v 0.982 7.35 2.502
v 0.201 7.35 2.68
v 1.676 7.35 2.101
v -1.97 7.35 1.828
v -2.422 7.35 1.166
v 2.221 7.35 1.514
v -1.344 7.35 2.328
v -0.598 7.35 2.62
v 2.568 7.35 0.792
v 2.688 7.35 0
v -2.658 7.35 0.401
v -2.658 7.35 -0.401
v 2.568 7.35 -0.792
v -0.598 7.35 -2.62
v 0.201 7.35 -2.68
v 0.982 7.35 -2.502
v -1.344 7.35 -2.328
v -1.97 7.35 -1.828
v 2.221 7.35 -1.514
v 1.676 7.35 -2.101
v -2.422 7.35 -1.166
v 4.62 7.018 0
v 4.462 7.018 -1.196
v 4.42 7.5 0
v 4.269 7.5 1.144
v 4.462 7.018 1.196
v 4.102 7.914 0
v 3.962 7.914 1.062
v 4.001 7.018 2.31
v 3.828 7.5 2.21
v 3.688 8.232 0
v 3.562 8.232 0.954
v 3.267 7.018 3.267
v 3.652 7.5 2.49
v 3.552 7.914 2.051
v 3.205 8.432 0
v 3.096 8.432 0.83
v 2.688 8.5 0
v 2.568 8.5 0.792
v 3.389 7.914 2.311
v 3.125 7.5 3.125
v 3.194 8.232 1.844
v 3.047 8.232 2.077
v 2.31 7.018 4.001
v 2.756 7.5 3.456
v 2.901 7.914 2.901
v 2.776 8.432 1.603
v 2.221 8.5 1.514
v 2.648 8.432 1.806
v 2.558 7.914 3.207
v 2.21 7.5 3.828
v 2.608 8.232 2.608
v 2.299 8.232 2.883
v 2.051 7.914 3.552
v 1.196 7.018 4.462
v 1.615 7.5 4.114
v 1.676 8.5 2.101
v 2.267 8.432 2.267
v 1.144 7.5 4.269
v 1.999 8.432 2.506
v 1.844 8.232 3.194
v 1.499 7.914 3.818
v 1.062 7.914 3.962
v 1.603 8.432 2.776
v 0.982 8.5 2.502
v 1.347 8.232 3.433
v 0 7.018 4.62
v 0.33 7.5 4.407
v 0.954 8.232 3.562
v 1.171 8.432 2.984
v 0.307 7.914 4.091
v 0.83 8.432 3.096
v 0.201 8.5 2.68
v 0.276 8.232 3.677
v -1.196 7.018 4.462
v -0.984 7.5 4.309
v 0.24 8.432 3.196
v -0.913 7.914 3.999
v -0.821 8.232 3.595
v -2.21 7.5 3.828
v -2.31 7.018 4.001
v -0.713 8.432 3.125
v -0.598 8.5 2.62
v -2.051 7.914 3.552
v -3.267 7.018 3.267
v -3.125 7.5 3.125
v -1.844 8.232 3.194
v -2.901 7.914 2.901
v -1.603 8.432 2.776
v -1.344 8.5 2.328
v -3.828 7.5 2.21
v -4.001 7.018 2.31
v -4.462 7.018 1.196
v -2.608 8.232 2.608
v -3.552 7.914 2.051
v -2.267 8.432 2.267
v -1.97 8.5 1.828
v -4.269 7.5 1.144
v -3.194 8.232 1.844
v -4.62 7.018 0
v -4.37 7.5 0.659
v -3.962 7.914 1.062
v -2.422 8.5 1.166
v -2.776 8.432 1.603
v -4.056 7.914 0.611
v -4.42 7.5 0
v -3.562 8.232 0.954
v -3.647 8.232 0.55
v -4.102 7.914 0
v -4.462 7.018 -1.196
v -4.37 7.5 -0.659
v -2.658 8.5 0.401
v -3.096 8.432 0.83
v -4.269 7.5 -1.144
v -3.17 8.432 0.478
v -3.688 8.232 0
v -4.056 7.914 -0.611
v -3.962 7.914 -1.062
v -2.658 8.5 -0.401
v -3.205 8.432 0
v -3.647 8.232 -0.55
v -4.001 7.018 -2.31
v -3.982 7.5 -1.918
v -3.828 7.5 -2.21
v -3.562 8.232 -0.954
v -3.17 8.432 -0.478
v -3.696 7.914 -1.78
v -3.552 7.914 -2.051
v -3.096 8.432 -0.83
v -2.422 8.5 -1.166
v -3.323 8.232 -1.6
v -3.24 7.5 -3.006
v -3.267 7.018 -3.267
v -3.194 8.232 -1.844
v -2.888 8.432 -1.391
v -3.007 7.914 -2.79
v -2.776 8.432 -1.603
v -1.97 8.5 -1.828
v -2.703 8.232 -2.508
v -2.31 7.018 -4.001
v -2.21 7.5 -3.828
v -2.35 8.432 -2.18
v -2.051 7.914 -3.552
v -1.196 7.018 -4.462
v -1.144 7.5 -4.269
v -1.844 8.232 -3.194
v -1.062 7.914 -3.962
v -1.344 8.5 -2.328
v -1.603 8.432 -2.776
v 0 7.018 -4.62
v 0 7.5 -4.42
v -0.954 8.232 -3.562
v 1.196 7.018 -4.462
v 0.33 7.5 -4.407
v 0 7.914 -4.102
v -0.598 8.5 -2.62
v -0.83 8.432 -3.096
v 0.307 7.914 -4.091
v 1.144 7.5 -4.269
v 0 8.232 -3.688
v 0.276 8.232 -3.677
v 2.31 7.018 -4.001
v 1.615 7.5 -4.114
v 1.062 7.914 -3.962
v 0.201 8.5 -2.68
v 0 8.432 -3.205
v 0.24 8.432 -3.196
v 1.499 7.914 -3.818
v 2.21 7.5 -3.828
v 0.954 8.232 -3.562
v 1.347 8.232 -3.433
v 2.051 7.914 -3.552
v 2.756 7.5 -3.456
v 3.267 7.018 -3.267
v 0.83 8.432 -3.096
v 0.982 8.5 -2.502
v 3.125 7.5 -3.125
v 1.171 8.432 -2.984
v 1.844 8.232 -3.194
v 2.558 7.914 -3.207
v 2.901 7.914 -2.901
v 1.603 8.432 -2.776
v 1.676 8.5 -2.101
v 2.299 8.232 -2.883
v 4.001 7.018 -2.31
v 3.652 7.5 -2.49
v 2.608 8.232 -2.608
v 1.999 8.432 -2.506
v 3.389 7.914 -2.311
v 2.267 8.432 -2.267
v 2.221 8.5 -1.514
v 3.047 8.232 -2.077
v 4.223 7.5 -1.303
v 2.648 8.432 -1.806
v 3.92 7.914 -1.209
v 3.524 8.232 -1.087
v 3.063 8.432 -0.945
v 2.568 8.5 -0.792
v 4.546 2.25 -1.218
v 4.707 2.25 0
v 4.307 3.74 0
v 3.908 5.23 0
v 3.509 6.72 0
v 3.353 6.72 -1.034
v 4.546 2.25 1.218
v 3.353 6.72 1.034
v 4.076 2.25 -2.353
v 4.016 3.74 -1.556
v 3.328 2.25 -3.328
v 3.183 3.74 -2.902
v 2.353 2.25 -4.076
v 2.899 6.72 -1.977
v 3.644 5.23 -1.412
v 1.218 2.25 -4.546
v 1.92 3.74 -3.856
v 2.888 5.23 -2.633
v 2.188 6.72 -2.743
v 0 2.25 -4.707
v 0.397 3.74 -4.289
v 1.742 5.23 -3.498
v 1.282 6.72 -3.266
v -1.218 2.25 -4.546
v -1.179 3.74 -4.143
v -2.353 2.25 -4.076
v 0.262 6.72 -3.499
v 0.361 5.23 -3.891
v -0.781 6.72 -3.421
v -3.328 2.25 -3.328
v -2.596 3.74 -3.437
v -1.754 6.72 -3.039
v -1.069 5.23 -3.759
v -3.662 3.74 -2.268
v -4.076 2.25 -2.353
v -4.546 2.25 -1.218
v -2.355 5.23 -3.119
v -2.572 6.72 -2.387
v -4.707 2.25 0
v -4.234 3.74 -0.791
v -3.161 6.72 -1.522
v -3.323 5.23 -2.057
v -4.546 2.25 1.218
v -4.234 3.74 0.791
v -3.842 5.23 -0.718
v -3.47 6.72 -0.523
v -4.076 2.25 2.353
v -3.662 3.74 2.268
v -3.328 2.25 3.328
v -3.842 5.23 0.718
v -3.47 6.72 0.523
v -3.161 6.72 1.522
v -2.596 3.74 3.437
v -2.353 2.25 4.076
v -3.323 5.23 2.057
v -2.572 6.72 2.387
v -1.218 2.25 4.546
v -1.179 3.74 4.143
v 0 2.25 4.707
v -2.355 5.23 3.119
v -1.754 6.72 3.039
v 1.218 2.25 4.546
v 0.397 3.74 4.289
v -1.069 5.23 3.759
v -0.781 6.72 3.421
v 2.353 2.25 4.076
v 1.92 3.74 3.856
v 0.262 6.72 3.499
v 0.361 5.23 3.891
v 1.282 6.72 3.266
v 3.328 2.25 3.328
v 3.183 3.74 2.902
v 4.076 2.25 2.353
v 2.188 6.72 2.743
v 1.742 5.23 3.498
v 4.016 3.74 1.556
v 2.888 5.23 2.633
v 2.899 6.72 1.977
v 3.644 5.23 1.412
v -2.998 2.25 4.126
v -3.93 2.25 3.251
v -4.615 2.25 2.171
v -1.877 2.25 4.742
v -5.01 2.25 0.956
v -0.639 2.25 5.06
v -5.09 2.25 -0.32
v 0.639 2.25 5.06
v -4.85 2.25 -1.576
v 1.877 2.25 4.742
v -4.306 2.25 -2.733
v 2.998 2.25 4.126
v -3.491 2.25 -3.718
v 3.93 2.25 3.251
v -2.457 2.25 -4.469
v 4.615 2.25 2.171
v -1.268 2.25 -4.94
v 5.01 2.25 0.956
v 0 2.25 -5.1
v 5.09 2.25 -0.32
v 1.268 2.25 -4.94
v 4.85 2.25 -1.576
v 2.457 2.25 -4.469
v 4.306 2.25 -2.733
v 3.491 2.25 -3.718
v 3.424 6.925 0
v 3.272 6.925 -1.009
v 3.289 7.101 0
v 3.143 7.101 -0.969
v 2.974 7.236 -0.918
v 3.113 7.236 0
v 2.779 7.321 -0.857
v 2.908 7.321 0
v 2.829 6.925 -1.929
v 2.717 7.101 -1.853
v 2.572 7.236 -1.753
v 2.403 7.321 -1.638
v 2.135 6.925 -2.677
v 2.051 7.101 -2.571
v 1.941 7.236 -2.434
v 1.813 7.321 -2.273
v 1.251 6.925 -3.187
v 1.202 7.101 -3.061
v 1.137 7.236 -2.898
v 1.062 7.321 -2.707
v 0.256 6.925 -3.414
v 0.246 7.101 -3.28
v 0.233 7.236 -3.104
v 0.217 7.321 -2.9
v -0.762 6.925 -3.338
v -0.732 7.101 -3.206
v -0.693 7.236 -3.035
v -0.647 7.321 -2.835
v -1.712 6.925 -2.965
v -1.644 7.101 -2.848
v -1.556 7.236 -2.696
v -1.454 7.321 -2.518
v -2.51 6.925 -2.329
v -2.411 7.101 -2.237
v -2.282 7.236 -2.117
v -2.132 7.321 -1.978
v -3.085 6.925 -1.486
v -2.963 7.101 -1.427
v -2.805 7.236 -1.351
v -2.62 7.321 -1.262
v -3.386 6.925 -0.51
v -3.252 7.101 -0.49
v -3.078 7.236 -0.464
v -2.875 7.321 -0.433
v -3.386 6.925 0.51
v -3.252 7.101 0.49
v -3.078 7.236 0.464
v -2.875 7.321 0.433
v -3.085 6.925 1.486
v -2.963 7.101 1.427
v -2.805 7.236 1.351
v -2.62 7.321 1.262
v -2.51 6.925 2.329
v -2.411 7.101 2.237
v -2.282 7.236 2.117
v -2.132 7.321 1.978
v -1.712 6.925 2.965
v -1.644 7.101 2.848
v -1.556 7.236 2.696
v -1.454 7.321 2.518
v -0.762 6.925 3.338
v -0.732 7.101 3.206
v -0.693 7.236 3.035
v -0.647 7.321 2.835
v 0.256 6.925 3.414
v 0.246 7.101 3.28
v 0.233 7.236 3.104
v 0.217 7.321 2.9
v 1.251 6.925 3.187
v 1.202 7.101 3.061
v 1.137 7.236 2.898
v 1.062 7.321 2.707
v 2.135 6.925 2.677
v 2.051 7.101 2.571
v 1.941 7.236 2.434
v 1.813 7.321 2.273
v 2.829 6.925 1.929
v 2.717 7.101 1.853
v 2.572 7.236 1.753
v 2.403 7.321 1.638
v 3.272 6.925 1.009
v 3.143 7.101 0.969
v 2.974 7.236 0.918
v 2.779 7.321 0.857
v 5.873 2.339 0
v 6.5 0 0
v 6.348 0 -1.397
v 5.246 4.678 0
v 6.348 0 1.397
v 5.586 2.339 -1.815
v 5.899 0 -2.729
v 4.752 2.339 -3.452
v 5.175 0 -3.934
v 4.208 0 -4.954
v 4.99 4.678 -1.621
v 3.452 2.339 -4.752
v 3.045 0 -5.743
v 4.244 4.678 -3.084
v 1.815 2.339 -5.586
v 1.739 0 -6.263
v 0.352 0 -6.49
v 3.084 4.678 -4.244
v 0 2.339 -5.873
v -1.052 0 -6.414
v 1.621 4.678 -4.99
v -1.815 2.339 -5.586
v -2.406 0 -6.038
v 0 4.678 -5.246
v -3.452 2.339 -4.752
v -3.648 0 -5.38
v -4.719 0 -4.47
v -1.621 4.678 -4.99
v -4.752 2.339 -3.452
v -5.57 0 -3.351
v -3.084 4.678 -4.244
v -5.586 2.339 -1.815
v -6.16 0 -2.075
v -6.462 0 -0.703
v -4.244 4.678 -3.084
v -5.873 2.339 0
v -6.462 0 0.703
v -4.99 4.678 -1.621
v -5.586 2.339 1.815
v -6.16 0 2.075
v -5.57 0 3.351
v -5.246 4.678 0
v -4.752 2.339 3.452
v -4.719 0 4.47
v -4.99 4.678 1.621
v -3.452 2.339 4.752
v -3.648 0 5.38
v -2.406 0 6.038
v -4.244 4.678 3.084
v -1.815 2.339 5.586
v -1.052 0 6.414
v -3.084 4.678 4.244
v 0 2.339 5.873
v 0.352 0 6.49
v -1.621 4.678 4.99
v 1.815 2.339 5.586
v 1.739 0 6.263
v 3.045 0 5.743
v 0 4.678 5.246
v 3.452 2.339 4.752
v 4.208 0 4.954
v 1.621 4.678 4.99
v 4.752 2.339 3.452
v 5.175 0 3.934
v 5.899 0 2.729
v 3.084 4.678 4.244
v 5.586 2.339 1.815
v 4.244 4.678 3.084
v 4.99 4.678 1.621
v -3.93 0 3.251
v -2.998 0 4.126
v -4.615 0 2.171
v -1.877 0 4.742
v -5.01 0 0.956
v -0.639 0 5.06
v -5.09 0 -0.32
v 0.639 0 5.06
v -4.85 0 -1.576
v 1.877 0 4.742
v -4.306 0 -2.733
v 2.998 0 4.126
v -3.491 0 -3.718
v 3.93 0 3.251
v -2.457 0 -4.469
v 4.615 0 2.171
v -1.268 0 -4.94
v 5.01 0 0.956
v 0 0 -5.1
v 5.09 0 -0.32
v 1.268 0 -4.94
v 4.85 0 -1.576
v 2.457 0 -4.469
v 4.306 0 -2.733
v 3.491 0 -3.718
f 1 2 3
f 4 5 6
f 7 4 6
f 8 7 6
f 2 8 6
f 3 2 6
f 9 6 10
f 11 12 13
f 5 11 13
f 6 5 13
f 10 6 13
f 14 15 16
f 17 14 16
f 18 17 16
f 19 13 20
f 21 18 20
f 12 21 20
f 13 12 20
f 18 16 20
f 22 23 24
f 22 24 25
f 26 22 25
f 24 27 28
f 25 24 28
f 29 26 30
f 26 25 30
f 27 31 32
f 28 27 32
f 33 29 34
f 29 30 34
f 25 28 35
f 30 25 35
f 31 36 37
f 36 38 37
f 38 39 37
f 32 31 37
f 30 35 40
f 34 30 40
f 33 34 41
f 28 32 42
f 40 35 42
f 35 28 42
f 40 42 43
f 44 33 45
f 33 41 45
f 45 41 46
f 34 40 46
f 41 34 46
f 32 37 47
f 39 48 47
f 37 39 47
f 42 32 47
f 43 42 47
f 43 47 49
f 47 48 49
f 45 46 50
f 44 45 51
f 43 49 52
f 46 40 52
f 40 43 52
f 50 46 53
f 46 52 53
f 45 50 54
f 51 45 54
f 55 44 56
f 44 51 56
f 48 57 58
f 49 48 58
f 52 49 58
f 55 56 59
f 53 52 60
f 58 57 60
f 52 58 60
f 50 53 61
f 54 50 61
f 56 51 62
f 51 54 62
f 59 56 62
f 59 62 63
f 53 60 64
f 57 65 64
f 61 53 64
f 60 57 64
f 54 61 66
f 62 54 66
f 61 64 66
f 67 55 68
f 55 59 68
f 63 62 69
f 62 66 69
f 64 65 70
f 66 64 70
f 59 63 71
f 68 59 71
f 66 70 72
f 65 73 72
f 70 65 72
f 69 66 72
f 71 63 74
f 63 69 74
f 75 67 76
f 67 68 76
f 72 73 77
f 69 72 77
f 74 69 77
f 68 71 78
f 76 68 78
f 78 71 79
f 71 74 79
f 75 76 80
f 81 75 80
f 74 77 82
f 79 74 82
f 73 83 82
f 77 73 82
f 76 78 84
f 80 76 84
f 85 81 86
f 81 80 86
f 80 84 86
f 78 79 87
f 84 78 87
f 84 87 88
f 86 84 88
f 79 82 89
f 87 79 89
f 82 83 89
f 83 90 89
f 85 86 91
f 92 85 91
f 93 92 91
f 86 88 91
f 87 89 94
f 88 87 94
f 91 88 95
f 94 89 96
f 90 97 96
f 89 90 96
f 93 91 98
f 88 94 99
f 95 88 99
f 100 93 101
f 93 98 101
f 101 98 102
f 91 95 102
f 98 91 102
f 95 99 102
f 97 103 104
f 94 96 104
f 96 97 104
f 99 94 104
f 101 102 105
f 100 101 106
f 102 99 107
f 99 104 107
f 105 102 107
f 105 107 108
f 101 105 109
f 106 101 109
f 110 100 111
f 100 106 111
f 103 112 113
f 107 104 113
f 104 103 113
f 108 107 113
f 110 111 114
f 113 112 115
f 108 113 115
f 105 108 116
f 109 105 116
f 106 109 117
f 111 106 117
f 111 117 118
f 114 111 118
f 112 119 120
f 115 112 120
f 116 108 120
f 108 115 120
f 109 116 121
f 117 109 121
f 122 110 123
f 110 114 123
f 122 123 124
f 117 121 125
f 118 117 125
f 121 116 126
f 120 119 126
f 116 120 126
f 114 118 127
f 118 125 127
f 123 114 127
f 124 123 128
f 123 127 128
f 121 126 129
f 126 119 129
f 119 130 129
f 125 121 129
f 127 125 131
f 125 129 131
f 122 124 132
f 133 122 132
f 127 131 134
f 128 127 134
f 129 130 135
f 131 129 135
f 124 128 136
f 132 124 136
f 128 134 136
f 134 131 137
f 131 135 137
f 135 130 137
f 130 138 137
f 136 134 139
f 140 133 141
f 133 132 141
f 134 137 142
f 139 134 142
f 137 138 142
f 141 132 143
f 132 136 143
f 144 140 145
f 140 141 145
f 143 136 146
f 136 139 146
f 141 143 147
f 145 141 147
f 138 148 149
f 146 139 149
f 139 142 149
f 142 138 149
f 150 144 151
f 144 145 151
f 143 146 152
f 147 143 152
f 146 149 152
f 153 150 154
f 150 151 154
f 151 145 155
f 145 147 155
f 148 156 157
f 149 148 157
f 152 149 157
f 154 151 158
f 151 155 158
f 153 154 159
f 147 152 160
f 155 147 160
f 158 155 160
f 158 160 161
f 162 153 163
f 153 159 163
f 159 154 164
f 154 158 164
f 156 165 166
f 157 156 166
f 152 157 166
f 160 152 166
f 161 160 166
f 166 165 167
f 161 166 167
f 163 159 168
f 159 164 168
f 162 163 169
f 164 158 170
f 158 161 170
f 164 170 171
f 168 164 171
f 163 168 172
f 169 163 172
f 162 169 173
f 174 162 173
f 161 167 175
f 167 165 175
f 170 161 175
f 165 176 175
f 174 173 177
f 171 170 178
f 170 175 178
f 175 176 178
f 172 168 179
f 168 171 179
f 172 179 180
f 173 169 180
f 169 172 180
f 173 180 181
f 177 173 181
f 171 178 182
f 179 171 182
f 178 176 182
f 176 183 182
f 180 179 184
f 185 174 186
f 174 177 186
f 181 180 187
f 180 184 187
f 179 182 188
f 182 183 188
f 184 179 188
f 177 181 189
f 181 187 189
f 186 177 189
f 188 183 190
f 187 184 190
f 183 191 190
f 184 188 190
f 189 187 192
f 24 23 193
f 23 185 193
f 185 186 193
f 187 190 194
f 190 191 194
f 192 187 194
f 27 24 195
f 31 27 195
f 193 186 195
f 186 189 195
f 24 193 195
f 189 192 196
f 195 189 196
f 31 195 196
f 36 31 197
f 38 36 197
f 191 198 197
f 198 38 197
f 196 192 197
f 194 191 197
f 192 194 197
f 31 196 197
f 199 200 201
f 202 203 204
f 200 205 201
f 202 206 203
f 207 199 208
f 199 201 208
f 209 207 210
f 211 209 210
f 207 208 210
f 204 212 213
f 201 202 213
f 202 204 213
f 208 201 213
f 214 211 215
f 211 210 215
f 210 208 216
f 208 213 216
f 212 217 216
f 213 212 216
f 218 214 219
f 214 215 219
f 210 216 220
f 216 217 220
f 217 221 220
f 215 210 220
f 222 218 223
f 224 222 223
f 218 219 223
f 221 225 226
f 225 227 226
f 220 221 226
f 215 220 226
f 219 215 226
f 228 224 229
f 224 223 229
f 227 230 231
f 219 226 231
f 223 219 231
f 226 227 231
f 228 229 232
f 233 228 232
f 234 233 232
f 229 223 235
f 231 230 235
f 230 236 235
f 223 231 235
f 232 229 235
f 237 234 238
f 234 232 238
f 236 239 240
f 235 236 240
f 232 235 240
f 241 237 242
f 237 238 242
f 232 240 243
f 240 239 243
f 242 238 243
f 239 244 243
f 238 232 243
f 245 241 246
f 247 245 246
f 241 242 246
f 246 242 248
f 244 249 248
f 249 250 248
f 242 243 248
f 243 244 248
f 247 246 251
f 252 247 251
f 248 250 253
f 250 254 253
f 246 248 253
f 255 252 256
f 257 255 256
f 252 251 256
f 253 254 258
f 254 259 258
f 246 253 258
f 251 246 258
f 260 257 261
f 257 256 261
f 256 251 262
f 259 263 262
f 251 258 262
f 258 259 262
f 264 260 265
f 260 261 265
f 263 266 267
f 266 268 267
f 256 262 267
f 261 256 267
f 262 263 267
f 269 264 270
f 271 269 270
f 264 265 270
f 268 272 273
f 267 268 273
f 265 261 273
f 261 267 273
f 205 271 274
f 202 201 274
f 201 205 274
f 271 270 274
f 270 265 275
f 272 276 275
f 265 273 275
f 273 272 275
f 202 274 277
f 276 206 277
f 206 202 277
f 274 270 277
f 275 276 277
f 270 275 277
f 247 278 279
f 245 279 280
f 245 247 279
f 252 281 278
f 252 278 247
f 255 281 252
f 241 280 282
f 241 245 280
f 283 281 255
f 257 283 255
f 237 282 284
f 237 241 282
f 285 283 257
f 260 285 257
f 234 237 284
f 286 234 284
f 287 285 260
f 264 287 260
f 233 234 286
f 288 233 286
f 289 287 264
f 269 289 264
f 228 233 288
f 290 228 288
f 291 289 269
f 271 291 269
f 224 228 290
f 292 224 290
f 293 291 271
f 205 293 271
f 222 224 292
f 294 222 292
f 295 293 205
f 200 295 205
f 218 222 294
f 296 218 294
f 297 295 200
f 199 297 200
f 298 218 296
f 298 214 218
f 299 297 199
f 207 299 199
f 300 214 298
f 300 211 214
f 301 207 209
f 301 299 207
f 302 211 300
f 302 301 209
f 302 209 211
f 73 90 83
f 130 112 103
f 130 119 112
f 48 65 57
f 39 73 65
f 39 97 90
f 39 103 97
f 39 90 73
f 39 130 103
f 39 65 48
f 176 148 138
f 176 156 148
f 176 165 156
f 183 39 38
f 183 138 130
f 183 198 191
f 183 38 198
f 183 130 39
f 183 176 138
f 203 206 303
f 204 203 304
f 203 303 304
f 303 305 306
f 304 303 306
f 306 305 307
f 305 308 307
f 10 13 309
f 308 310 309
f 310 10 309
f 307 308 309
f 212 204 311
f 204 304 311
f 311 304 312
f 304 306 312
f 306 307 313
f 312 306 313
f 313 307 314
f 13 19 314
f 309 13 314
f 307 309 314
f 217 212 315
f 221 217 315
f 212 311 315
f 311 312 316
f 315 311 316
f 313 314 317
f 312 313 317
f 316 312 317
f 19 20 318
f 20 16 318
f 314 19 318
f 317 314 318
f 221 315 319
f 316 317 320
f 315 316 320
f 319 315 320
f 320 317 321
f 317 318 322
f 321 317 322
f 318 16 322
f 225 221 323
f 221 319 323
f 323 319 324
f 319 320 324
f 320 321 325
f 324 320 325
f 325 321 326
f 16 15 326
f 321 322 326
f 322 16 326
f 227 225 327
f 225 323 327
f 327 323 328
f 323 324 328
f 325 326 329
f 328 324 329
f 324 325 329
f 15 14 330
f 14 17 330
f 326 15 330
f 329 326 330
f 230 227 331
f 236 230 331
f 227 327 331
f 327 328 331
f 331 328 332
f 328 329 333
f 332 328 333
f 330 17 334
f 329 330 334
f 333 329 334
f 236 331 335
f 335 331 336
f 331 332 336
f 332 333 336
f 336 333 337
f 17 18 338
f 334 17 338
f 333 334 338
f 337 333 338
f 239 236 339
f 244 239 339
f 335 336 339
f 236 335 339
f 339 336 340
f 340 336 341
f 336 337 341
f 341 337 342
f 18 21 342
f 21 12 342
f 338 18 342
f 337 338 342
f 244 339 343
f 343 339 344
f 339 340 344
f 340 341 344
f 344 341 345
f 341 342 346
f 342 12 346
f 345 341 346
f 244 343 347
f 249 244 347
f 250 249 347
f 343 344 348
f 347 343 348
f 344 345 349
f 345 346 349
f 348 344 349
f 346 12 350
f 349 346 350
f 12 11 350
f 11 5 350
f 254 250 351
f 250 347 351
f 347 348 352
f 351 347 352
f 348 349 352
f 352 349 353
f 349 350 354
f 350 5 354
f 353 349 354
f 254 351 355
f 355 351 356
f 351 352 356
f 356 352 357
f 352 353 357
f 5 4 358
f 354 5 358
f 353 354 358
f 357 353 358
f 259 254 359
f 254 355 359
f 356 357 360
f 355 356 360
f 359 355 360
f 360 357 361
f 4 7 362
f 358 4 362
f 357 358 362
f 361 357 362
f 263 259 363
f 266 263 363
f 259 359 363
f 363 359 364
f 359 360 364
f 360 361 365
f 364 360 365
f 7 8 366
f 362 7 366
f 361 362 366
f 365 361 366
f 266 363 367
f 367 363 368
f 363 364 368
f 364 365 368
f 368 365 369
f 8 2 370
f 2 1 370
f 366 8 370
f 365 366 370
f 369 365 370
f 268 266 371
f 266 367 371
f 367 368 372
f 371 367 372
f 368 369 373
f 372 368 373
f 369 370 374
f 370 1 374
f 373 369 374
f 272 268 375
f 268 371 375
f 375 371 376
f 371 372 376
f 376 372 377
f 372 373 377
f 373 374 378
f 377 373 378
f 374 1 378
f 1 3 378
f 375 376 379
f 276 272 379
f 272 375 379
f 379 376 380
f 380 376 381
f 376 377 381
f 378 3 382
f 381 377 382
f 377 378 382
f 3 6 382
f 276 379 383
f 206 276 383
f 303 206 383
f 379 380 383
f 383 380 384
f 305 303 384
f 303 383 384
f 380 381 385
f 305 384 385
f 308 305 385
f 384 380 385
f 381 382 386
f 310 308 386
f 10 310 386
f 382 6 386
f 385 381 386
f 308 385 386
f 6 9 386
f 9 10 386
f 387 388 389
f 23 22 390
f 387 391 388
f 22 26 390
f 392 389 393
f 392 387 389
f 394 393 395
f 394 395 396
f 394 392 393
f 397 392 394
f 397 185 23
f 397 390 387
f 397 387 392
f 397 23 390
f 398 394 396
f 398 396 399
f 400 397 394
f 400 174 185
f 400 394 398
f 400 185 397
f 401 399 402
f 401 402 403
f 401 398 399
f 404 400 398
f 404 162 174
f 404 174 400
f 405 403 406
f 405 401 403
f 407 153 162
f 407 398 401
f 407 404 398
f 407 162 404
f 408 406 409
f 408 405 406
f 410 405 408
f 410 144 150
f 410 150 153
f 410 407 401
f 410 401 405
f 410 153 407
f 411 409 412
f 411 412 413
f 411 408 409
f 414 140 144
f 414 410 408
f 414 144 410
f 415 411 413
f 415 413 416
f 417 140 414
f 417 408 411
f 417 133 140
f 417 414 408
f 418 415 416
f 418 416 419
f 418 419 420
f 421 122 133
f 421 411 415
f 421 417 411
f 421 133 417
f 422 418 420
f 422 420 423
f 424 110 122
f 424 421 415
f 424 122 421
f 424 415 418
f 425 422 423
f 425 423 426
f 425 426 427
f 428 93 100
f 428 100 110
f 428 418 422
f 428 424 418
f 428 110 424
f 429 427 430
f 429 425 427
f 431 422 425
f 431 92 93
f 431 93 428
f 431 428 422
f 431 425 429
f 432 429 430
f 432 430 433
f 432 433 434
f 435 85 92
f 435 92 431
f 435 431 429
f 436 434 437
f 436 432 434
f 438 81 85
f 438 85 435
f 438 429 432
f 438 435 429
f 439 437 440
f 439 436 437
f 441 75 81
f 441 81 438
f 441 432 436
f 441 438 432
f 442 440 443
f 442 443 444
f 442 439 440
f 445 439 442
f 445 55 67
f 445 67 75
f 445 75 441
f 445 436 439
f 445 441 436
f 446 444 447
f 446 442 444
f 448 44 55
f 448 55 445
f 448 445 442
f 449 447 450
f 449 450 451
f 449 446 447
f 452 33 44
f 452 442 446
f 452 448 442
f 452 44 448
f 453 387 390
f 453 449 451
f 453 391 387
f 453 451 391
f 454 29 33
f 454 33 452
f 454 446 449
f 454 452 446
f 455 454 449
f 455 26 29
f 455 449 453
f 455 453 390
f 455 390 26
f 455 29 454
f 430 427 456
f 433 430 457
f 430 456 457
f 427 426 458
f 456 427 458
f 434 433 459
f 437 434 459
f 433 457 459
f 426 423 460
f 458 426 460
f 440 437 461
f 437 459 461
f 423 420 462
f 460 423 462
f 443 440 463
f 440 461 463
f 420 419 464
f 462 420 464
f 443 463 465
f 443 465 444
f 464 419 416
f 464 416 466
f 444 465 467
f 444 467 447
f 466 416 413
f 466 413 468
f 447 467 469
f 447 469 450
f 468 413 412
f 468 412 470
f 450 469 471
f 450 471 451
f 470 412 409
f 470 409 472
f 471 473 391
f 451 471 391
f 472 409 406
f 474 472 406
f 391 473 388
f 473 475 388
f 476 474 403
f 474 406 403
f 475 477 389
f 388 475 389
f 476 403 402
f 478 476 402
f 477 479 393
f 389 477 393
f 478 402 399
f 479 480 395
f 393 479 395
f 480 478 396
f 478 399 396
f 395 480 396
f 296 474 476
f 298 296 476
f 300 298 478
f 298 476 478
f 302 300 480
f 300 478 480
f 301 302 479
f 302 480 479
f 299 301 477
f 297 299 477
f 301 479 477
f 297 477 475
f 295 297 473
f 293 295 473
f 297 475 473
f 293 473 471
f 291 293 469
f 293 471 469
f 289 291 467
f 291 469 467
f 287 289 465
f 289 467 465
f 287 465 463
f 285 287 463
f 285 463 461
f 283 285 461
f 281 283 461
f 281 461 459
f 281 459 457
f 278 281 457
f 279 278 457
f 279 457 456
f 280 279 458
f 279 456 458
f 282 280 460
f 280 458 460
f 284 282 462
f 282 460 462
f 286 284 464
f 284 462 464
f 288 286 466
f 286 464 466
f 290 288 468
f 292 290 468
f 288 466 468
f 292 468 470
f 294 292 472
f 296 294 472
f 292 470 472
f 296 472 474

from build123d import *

# Parameters (mm, degrees)
SKETCH1_R           = 6.5
BOSS_EXTRUDE1_DEPTH = 8.5
BOSS_EXTRUDE1_TAPER = 15
SKETCH2_R           = 5.1
CUT_EXTRUDE1_DEPTH  = 2.25
FILLET1_R           = 2


# Read off the part's stored shape, not the designer's step: Shell2
with BuildPart() as part:
    # Sketch1 → Boss-Extrude1 (new body)
    with BuildSketch(Plane(origin=(0, 0, 0), x_dir=(1, 0, 0), z_dir=(0, 1, 0))):
        Circle(SKETCH1_R)
    extrude(amount=BOSS_EXTRUDE1_DEPTH, taper=BOSS_EXTRUDE1_TAPER)

    # Sketch2 → Cut-Extrude1 (cut)
    with BuildSketch(Plane.XZ):
        with Locations(Location((0, 0, 0), (0, 0, 270))):
            Circle(SKETCH2_R)
    extrude(amount=-CUT_EXTRUDE1_DEPTH, mode=Mode.SUBTRACT)

    # Fillet1
    fillet1_edges = [part.edges().sort_by_distance(p)[0] for p in [
        (-4.222431864, 8.5, 0),
    ]]
    fillet(fillet1_edges, radius=FILLET1_R)

    # Shell2 outline → Shell2 (revolve, cut)
    with BuildSketch(Plane.XY):
        with BuildLine():
            Line((4.70654671, 2.25), (3.508814841, 6.719996188))
            ThreePointArc((3.508814841, 6.719996188), (3.205225103, 7.174350339), (2.687777888, 7.35))
            Line((2.687777888, 7.35), (0, 7.35))
            Line((0, 7.35), (0, 2.25))
            Line((0, 2.25), (4.70654671, 2.25))
        make_face()
    revolve(axis=Axis((0, 0, 0), (0, 1, 0)), mode=Mode.SUBTRACT)


solid = part.part
